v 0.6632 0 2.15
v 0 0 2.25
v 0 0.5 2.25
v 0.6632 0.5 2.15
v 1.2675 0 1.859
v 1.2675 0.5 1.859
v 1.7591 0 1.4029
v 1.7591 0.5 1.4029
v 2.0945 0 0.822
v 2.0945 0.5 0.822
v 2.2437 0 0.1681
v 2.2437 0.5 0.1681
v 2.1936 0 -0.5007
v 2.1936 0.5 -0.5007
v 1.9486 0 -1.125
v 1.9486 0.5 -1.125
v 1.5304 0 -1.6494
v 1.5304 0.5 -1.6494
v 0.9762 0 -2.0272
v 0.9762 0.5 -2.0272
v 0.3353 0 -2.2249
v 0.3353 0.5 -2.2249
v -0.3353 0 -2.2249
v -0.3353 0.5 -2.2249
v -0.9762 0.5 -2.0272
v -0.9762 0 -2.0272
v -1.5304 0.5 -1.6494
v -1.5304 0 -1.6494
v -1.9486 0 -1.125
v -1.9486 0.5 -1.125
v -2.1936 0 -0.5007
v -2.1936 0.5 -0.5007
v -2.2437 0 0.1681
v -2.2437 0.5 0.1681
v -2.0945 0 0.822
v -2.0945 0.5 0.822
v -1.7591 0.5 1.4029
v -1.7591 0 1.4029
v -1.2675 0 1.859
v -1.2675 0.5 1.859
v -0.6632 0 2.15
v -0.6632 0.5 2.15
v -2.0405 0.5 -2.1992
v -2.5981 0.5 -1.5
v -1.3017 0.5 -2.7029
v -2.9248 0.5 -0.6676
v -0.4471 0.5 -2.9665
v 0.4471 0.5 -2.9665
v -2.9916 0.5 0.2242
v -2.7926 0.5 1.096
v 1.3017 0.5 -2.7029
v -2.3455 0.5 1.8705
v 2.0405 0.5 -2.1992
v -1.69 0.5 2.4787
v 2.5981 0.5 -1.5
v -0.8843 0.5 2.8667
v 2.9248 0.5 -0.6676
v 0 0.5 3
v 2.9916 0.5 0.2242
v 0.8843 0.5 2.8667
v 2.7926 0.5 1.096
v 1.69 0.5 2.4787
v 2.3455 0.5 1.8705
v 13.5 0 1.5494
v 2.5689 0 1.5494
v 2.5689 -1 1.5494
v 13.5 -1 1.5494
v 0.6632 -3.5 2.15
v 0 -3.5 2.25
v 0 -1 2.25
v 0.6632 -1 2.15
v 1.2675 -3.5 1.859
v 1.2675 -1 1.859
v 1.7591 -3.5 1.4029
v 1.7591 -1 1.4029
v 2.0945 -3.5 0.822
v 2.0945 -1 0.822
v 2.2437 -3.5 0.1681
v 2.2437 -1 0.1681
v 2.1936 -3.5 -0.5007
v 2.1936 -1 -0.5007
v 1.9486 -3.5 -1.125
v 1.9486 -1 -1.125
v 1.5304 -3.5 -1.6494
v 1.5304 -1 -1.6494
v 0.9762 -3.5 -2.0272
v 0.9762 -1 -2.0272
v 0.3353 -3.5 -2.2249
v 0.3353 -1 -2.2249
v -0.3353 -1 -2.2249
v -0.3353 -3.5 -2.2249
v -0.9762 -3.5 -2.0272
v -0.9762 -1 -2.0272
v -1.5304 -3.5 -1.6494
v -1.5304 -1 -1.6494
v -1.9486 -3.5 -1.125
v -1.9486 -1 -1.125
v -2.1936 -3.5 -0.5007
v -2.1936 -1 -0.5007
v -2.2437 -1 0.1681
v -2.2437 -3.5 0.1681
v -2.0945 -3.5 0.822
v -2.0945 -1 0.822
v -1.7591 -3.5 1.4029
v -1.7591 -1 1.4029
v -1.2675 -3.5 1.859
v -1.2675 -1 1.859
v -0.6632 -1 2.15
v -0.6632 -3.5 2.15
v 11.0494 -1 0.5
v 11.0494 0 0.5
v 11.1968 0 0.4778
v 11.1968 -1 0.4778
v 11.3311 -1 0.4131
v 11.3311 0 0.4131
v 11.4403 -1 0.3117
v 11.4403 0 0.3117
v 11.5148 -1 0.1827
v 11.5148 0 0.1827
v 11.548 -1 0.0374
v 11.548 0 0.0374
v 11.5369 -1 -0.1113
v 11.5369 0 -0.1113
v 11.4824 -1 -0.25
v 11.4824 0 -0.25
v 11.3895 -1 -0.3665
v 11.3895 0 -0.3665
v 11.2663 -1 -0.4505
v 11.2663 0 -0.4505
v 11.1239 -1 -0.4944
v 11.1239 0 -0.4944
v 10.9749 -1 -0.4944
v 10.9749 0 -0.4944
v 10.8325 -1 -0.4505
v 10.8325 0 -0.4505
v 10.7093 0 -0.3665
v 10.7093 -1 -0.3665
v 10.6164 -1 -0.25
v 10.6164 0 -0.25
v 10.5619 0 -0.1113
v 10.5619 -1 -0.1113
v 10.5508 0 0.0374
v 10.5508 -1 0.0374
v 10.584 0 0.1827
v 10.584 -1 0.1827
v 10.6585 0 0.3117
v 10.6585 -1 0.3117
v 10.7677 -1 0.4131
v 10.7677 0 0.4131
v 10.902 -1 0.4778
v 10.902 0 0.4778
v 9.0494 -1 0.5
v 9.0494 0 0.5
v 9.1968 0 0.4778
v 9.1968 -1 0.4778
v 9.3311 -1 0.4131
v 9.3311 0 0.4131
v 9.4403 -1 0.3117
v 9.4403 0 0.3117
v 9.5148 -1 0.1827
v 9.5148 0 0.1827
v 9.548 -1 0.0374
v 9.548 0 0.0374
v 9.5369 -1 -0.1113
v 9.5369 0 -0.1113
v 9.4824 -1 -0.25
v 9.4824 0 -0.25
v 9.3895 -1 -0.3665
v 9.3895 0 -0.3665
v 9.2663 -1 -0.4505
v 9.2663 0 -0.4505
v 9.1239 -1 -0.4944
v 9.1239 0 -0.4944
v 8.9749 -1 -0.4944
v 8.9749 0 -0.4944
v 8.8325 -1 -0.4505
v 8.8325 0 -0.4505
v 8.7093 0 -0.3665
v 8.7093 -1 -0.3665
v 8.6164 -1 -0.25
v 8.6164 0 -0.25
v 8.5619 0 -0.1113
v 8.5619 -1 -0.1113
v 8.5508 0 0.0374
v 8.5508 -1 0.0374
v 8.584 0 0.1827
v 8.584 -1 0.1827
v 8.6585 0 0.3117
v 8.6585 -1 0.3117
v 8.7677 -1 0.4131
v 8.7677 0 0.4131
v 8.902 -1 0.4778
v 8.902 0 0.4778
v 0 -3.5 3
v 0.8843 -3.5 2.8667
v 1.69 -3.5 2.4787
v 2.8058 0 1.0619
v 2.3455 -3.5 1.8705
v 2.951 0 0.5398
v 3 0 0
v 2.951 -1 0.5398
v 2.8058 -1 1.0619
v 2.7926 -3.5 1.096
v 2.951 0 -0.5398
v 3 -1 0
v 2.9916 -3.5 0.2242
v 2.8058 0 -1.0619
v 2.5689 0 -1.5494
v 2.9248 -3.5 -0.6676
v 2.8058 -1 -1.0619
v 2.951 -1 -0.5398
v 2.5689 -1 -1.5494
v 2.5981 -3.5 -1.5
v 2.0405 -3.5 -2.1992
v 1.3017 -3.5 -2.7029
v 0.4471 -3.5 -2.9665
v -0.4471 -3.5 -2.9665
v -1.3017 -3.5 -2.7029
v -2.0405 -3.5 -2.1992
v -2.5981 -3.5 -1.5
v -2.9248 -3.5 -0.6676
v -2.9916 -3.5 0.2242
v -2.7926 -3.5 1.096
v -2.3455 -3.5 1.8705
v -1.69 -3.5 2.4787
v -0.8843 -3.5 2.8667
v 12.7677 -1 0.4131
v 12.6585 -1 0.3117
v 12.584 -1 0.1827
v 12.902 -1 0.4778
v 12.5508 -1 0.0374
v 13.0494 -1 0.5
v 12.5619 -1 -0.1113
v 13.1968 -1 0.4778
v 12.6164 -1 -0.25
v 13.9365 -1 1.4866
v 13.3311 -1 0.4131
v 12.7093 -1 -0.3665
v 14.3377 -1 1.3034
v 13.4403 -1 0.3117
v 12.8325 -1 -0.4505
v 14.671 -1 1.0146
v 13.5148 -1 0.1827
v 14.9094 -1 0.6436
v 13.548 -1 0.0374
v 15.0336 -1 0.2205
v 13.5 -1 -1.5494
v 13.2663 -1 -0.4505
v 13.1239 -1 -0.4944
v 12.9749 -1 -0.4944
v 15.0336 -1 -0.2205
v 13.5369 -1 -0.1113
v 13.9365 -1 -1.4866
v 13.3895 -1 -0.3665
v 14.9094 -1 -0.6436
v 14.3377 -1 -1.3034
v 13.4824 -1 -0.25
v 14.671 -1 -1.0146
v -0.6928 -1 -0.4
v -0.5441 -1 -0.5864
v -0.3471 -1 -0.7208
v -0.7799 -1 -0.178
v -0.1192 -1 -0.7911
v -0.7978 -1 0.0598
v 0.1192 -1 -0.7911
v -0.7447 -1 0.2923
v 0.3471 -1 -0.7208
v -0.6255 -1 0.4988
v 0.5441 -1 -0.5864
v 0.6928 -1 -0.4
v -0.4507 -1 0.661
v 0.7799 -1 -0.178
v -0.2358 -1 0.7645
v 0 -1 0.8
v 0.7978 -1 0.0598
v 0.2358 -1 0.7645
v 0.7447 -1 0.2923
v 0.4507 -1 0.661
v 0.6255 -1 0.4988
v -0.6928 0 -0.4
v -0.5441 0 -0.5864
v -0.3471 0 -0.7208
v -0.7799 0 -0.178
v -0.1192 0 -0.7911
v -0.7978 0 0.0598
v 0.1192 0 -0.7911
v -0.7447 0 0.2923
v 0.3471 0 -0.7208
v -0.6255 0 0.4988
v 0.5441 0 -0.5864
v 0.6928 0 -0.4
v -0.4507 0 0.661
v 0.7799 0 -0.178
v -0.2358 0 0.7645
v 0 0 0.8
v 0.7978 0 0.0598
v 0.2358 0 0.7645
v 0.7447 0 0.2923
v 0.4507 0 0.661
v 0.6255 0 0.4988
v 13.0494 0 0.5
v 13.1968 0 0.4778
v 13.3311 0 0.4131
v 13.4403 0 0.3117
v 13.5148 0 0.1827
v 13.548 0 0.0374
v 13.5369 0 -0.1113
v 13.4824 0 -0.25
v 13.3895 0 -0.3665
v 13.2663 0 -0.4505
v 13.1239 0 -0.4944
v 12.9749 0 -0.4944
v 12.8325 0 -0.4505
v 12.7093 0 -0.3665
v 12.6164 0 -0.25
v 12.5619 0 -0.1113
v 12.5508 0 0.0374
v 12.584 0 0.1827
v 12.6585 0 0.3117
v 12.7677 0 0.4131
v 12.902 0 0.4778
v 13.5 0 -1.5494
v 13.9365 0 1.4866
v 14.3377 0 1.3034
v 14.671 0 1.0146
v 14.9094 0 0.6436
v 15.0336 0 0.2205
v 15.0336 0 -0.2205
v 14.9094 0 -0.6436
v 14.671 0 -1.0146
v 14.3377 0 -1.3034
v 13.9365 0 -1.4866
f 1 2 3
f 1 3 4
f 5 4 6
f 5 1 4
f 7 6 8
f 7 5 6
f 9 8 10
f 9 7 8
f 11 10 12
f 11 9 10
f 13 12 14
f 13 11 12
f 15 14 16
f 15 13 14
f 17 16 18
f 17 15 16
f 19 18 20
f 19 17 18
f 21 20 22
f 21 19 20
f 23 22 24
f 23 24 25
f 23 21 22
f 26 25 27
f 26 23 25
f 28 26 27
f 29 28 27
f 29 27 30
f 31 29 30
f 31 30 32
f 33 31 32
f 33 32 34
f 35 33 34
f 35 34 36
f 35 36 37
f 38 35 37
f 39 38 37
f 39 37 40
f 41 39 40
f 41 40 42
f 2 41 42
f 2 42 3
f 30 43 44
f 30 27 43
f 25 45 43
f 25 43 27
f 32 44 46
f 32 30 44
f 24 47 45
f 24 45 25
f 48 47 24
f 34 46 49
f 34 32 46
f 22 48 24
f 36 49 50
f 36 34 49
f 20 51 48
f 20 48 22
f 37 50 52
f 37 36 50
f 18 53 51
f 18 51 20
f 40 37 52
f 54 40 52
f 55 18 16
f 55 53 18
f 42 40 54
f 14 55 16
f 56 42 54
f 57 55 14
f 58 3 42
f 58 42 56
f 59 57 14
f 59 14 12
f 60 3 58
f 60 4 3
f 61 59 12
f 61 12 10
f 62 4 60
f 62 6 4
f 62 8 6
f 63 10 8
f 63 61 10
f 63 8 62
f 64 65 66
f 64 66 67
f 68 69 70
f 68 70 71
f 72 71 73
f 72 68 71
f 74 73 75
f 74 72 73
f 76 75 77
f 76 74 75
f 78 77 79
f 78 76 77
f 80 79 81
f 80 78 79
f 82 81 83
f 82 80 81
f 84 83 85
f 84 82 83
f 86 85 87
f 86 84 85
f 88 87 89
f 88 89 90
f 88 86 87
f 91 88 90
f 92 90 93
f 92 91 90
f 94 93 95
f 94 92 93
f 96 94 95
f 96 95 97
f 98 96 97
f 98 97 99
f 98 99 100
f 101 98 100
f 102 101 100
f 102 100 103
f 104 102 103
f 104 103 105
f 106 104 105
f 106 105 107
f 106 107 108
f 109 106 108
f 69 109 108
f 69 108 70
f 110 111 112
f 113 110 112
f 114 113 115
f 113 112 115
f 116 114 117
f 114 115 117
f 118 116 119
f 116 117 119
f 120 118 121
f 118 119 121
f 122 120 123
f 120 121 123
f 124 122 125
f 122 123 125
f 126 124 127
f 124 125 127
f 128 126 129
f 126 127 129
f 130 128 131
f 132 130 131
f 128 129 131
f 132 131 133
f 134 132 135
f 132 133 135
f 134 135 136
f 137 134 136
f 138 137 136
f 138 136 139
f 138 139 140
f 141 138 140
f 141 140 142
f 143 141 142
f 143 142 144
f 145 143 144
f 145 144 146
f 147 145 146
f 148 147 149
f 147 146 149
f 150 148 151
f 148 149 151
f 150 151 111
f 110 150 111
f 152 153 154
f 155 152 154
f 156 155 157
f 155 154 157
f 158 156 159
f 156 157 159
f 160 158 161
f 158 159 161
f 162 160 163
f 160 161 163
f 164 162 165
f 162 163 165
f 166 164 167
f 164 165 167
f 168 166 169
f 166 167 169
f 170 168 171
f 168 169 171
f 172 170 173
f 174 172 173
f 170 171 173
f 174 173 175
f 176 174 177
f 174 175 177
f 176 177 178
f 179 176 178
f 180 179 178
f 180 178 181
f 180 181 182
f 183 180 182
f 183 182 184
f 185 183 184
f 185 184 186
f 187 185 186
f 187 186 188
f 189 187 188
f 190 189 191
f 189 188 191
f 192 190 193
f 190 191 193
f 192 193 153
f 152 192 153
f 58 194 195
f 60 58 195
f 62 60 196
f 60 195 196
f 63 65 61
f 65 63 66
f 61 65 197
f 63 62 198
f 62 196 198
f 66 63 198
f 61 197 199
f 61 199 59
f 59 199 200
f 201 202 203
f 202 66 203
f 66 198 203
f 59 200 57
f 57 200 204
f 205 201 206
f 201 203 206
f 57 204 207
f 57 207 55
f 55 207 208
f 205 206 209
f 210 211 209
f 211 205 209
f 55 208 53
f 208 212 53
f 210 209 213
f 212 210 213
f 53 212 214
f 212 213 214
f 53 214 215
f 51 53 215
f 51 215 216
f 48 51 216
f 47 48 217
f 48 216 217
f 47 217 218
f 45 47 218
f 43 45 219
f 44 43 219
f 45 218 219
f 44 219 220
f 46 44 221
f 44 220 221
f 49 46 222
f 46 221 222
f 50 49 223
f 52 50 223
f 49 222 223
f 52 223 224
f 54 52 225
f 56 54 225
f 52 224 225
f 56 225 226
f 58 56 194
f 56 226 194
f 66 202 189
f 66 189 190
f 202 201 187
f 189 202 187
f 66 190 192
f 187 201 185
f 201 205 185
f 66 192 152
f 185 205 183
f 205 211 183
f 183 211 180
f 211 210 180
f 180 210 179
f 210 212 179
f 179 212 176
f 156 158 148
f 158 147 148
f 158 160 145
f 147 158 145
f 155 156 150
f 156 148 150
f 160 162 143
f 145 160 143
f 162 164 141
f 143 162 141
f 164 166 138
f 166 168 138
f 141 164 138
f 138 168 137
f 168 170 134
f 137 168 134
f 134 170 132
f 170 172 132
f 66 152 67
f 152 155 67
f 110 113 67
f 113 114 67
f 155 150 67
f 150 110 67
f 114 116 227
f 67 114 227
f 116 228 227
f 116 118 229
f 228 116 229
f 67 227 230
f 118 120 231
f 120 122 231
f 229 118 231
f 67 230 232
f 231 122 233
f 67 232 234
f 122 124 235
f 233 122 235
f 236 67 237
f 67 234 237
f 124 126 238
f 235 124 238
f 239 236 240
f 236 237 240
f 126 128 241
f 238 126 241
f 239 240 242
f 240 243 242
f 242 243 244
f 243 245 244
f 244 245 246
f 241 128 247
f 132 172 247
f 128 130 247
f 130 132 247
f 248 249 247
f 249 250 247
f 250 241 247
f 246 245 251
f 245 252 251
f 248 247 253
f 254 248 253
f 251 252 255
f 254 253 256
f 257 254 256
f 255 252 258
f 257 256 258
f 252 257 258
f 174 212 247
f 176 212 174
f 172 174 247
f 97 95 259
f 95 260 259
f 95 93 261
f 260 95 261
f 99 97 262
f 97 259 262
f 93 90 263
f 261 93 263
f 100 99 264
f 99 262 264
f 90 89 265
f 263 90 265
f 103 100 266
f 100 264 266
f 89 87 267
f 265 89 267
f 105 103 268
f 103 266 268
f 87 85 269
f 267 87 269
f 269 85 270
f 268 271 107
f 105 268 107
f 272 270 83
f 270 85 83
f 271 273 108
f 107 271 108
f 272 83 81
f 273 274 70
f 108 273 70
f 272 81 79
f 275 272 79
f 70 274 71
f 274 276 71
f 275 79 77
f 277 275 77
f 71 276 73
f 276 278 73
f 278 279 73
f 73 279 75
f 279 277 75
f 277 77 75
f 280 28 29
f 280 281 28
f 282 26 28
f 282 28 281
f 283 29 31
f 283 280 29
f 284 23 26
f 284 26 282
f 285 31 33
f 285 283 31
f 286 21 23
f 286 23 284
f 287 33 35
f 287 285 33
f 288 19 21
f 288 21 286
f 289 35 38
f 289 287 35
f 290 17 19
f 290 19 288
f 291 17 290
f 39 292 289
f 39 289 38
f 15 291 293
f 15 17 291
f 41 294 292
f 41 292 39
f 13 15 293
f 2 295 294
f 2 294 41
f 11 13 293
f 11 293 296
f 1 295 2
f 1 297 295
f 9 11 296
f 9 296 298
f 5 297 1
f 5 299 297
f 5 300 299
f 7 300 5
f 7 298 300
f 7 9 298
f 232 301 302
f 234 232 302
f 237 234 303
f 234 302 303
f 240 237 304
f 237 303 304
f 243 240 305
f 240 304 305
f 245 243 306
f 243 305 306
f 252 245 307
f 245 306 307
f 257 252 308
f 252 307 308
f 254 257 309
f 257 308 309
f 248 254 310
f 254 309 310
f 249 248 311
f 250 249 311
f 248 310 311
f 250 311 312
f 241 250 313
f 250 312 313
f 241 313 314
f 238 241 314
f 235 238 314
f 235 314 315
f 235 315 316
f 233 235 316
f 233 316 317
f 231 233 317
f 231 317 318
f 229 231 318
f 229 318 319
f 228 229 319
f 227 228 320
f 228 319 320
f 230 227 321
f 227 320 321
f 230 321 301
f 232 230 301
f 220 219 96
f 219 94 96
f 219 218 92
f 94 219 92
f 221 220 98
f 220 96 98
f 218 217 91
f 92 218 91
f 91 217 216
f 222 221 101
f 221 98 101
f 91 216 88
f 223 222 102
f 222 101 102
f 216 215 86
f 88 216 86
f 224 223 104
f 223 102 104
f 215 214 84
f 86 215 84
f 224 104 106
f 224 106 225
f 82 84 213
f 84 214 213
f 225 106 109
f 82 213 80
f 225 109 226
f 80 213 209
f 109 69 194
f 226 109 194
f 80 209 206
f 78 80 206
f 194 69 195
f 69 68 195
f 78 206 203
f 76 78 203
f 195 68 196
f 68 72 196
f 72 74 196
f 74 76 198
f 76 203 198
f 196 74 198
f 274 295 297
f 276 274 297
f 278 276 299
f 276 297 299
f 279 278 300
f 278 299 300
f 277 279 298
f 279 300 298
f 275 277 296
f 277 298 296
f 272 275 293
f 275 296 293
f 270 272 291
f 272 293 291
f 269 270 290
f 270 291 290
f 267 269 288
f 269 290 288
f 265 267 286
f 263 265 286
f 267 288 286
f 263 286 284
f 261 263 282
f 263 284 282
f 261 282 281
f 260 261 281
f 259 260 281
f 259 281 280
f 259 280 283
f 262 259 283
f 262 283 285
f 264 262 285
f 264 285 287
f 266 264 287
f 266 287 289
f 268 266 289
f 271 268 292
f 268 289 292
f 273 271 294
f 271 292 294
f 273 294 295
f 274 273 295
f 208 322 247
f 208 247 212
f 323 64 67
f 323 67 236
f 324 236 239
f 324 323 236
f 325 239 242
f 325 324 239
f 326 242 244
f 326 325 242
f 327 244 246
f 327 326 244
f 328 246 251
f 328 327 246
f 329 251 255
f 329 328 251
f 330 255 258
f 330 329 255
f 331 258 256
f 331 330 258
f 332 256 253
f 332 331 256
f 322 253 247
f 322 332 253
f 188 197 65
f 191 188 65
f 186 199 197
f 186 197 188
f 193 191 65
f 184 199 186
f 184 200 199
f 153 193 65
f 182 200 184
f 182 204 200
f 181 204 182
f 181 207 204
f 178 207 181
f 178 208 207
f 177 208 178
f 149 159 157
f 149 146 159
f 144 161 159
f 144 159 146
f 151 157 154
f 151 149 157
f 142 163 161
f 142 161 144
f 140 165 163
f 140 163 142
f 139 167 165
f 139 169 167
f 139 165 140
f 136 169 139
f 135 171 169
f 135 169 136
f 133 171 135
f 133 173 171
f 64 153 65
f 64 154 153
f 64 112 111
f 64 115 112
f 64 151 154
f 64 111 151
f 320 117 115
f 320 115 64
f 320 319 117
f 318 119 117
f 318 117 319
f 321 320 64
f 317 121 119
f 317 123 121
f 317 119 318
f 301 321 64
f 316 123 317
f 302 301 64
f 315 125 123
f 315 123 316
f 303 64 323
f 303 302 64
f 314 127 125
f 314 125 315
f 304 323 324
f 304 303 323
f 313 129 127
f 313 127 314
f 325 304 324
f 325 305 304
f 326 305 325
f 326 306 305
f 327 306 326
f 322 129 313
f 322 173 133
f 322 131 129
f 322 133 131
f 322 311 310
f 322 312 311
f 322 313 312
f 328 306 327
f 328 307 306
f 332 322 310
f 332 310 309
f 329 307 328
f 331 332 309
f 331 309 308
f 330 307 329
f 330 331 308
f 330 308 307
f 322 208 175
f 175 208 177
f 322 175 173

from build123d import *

# Parameters (mm, degrees)
SKETCH_1_R      = 2.25
EXTRUDE_1_DEPTH = 0.5
EXTRUDE_START   = -3.5
SKETCH_1_7_R    = 2.25
EXTRUDE_2_DEPTH = 3.5
EXTRUDE_START_2 = -1
SKETCH_1_8_R    = 0.5
SKETCH_1_8_R_2  = 2.25
SKETCH_1_8_R_3  = 0.8
EXTRUDE_3_DEPTH = 1


with BuildPart() as part:
    # 草图1 → 凸台-拉伸1 (new body)
    with BuildSketch(Plane(origin=(0, 0, 0), x_dir=(1, 0, 0), z_dir=(0, 1, 0))):
        with BuildLine():
            ThreePointArc((3, 0), (2.890221403, 0.804127004), (2.568919841, 1.549403386))
            ThreePointArc((2.568919841, 1.549403386), (-3, 0), (2.568919841, -1.549403386))
            ThreePointArc((2.568919841, -1.549403386), (2.890221403, -0.804127004), (3, 0))
        make_face()
        Circle(SKETCH_1_R, mode=Mode.SUBTRACT)
    extrude(amount=EXTRUDE_1_DEPTH)

    # 草图1<7> → 凸台-拉伸2 (add)
    with BuildSketch(Plane(origin=(0, 0, 0), x_dir=(1, 0, 0), z_dir=(0, 1, 0)).offset(EXTRUDE_START)):
        with BuildLine():
            ThreePointArc((3, 0), (2.890221403, 0.804127004), (2.568919841, 1.549403386))
            ThreePointArc((2.568919841, 1.549403386), (-3, 0), (2.568919841, -1.549403386))
            ThreePointArc((2.568919841, -1.549403386), (2.890221403, -0.804127004), (3, 0))
        make_face()
        Circle(SKETCH_1_7_R, mode=Mode.SUBTRACT)
    extrude(amount=EXTRUDE_2_DEPTH)

    # 草图1<8> → 凸台-拉伸3 (add)
    # profile 1 of 2: a face of its own
    with BuildSketch(Plane(origin=(0, 0, 0), x_dir=(1, 0, 0), z_dir=(0, 1, 0)).offset(EXTRUDE_START_2)):
        with BuildLine():
            ThreePointArc((13.5, -1.549403386), (15.049403386, 0), (13.5, 1.549403386))
            Line((13.5, 1.549403386), (2.568919841, 1.549403386))
            ThreePointArc((2.568919841, 1.549403386), (3, 0), (2.568919841, -1.549403386))
            Line((2.568919841, -1.549403386), (13.5, -1.549403386))
        make_face()
        with Locations((9.049403386, 0)):
            Circle(SKETCH_1_8_R, mode=Mode.SUBTRACT)
        with Locations((11.049403386, 0)):
            Circle(SKETCH_1_8_R, mode=Mode.SUBTRACT)
        with Locations((13.049403386, 0)):
            Circle(SKETCH_1_8_R, mode=Mode.SUBTRACT)
    # profile 2 of 2: a face of its own
    with BuildSketch(Plane(origin=(0, 0, 0), x_dir=(1, 0, 0), z_dir=(0, 1, 0)).offset(EXTRUDE_START_2)):
        Circle(SKETCH_1_8_R_2)
        Circle(SKETCH_1_8_R_3, mode=Mode.SUBTRACT)
    extrude(amount=EXTRUDE_3_DEPTH)


solid = part.part
